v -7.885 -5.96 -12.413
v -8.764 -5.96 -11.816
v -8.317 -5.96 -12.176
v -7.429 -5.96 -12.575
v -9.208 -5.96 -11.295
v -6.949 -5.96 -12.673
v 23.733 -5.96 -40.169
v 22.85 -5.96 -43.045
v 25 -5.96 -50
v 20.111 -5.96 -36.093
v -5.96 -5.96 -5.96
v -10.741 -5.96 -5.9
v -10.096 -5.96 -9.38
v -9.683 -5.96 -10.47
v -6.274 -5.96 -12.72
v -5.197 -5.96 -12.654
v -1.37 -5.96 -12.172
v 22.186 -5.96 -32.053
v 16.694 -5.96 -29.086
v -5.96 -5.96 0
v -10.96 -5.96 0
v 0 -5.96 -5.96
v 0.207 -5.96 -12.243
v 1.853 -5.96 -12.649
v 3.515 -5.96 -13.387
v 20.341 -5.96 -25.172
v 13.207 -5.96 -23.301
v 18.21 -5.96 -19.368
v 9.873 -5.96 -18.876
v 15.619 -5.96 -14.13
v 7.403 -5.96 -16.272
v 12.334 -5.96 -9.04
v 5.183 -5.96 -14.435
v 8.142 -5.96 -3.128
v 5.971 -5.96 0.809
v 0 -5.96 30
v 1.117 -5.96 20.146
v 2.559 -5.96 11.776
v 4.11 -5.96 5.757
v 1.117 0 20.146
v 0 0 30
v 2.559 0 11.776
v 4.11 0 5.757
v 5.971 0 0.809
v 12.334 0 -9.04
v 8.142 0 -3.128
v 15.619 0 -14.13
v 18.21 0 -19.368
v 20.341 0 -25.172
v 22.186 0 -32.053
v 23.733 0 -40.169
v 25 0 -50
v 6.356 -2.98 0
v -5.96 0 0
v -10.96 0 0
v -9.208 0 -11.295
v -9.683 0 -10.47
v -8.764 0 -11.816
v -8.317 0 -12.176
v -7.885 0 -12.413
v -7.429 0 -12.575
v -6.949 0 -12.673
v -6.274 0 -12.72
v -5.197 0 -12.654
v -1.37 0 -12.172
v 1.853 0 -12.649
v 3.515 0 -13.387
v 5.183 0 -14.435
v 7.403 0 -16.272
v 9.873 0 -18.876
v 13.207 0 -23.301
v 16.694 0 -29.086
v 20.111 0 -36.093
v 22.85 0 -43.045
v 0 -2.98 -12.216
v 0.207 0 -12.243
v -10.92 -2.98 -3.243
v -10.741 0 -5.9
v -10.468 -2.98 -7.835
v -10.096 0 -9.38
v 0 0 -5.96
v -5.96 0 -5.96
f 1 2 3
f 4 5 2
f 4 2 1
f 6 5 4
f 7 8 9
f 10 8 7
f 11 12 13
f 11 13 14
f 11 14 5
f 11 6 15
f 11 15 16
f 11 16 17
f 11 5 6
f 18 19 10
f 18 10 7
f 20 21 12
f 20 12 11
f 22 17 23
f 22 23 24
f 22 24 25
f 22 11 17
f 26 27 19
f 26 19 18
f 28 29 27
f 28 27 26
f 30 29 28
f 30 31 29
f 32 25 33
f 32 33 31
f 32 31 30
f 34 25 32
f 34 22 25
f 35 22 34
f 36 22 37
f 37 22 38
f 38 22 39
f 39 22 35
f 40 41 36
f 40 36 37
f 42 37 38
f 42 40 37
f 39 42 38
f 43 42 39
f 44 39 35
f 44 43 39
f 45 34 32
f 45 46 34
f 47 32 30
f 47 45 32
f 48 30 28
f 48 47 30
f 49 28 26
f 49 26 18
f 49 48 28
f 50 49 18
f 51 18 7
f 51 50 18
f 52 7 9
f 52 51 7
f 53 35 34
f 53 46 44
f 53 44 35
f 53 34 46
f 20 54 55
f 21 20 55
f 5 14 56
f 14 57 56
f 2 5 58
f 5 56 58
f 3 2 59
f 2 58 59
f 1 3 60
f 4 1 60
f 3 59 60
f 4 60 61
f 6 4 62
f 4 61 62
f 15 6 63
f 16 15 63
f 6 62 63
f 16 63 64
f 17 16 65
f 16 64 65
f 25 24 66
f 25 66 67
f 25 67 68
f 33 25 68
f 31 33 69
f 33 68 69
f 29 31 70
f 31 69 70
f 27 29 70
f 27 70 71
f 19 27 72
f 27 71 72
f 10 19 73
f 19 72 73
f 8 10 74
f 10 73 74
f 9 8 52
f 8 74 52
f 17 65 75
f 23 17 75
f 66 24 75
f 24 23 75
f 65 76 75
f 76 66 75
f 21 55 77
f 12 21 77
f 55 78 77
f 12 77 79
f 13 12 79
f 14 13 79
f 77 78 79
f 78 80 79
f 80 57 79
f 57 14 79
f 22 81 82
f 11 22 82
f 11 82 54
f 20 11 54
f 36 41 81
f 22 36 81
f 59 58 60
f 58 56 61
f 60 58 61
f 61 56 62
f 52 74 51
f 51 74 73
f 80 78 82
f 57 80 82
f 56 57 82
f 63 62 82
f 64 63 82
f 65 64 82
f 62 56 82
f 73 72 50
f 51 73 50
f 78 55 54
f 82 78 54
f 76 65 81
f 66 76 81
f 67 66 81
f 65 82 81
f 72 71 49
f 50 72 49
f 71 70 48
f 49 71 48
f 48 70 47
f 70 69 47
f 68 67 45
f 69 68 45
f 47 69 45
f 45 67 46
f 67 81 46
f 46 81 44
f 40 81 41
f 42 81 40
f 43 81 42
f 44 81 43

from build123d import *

# Parameters (mm, degrees)
F1_DEPTH = 5.96


with BuildPart() as f1:
    # F0 (on Front) → F1 (new body)
    with BuildSketch(Plane.XZ):
        with BuildLine():
            Line((0, 30), (0, 0))
            Line((0, 0), (0, -5.96))
            Line((0, -5.96), (-5.96, -5.96))
            Line((-5.96, -5.96), (-5.96, 0))
            Line((-5.96, 0), (-10.96, 0))
            add(Edge.make_bspline(
                [(-10.96, 0), (-11.1221029879, -17.6632285655), (3.0655637103, -1.4052068975), (20.5156708304, -33.1052866865), (25, -50)],
                knots=[0, 0, 0, 0, 0.3757322825, 1, 1, 1, 1], degree=3))
            add(Edge.make_bspline(
                [(0, 30), (0.8943757174, 20.6114059437), (4.3218059913, -8.5269714368), (21.2292548934, -13.3699283132), (25, -50)],
                knots=[0, 0, 0, 0, 0.4311946523, 1, 1, 1, 1], degree=3))
        make_face()
    extrude(amount=F1_DEPTH)


solid = f1.part
